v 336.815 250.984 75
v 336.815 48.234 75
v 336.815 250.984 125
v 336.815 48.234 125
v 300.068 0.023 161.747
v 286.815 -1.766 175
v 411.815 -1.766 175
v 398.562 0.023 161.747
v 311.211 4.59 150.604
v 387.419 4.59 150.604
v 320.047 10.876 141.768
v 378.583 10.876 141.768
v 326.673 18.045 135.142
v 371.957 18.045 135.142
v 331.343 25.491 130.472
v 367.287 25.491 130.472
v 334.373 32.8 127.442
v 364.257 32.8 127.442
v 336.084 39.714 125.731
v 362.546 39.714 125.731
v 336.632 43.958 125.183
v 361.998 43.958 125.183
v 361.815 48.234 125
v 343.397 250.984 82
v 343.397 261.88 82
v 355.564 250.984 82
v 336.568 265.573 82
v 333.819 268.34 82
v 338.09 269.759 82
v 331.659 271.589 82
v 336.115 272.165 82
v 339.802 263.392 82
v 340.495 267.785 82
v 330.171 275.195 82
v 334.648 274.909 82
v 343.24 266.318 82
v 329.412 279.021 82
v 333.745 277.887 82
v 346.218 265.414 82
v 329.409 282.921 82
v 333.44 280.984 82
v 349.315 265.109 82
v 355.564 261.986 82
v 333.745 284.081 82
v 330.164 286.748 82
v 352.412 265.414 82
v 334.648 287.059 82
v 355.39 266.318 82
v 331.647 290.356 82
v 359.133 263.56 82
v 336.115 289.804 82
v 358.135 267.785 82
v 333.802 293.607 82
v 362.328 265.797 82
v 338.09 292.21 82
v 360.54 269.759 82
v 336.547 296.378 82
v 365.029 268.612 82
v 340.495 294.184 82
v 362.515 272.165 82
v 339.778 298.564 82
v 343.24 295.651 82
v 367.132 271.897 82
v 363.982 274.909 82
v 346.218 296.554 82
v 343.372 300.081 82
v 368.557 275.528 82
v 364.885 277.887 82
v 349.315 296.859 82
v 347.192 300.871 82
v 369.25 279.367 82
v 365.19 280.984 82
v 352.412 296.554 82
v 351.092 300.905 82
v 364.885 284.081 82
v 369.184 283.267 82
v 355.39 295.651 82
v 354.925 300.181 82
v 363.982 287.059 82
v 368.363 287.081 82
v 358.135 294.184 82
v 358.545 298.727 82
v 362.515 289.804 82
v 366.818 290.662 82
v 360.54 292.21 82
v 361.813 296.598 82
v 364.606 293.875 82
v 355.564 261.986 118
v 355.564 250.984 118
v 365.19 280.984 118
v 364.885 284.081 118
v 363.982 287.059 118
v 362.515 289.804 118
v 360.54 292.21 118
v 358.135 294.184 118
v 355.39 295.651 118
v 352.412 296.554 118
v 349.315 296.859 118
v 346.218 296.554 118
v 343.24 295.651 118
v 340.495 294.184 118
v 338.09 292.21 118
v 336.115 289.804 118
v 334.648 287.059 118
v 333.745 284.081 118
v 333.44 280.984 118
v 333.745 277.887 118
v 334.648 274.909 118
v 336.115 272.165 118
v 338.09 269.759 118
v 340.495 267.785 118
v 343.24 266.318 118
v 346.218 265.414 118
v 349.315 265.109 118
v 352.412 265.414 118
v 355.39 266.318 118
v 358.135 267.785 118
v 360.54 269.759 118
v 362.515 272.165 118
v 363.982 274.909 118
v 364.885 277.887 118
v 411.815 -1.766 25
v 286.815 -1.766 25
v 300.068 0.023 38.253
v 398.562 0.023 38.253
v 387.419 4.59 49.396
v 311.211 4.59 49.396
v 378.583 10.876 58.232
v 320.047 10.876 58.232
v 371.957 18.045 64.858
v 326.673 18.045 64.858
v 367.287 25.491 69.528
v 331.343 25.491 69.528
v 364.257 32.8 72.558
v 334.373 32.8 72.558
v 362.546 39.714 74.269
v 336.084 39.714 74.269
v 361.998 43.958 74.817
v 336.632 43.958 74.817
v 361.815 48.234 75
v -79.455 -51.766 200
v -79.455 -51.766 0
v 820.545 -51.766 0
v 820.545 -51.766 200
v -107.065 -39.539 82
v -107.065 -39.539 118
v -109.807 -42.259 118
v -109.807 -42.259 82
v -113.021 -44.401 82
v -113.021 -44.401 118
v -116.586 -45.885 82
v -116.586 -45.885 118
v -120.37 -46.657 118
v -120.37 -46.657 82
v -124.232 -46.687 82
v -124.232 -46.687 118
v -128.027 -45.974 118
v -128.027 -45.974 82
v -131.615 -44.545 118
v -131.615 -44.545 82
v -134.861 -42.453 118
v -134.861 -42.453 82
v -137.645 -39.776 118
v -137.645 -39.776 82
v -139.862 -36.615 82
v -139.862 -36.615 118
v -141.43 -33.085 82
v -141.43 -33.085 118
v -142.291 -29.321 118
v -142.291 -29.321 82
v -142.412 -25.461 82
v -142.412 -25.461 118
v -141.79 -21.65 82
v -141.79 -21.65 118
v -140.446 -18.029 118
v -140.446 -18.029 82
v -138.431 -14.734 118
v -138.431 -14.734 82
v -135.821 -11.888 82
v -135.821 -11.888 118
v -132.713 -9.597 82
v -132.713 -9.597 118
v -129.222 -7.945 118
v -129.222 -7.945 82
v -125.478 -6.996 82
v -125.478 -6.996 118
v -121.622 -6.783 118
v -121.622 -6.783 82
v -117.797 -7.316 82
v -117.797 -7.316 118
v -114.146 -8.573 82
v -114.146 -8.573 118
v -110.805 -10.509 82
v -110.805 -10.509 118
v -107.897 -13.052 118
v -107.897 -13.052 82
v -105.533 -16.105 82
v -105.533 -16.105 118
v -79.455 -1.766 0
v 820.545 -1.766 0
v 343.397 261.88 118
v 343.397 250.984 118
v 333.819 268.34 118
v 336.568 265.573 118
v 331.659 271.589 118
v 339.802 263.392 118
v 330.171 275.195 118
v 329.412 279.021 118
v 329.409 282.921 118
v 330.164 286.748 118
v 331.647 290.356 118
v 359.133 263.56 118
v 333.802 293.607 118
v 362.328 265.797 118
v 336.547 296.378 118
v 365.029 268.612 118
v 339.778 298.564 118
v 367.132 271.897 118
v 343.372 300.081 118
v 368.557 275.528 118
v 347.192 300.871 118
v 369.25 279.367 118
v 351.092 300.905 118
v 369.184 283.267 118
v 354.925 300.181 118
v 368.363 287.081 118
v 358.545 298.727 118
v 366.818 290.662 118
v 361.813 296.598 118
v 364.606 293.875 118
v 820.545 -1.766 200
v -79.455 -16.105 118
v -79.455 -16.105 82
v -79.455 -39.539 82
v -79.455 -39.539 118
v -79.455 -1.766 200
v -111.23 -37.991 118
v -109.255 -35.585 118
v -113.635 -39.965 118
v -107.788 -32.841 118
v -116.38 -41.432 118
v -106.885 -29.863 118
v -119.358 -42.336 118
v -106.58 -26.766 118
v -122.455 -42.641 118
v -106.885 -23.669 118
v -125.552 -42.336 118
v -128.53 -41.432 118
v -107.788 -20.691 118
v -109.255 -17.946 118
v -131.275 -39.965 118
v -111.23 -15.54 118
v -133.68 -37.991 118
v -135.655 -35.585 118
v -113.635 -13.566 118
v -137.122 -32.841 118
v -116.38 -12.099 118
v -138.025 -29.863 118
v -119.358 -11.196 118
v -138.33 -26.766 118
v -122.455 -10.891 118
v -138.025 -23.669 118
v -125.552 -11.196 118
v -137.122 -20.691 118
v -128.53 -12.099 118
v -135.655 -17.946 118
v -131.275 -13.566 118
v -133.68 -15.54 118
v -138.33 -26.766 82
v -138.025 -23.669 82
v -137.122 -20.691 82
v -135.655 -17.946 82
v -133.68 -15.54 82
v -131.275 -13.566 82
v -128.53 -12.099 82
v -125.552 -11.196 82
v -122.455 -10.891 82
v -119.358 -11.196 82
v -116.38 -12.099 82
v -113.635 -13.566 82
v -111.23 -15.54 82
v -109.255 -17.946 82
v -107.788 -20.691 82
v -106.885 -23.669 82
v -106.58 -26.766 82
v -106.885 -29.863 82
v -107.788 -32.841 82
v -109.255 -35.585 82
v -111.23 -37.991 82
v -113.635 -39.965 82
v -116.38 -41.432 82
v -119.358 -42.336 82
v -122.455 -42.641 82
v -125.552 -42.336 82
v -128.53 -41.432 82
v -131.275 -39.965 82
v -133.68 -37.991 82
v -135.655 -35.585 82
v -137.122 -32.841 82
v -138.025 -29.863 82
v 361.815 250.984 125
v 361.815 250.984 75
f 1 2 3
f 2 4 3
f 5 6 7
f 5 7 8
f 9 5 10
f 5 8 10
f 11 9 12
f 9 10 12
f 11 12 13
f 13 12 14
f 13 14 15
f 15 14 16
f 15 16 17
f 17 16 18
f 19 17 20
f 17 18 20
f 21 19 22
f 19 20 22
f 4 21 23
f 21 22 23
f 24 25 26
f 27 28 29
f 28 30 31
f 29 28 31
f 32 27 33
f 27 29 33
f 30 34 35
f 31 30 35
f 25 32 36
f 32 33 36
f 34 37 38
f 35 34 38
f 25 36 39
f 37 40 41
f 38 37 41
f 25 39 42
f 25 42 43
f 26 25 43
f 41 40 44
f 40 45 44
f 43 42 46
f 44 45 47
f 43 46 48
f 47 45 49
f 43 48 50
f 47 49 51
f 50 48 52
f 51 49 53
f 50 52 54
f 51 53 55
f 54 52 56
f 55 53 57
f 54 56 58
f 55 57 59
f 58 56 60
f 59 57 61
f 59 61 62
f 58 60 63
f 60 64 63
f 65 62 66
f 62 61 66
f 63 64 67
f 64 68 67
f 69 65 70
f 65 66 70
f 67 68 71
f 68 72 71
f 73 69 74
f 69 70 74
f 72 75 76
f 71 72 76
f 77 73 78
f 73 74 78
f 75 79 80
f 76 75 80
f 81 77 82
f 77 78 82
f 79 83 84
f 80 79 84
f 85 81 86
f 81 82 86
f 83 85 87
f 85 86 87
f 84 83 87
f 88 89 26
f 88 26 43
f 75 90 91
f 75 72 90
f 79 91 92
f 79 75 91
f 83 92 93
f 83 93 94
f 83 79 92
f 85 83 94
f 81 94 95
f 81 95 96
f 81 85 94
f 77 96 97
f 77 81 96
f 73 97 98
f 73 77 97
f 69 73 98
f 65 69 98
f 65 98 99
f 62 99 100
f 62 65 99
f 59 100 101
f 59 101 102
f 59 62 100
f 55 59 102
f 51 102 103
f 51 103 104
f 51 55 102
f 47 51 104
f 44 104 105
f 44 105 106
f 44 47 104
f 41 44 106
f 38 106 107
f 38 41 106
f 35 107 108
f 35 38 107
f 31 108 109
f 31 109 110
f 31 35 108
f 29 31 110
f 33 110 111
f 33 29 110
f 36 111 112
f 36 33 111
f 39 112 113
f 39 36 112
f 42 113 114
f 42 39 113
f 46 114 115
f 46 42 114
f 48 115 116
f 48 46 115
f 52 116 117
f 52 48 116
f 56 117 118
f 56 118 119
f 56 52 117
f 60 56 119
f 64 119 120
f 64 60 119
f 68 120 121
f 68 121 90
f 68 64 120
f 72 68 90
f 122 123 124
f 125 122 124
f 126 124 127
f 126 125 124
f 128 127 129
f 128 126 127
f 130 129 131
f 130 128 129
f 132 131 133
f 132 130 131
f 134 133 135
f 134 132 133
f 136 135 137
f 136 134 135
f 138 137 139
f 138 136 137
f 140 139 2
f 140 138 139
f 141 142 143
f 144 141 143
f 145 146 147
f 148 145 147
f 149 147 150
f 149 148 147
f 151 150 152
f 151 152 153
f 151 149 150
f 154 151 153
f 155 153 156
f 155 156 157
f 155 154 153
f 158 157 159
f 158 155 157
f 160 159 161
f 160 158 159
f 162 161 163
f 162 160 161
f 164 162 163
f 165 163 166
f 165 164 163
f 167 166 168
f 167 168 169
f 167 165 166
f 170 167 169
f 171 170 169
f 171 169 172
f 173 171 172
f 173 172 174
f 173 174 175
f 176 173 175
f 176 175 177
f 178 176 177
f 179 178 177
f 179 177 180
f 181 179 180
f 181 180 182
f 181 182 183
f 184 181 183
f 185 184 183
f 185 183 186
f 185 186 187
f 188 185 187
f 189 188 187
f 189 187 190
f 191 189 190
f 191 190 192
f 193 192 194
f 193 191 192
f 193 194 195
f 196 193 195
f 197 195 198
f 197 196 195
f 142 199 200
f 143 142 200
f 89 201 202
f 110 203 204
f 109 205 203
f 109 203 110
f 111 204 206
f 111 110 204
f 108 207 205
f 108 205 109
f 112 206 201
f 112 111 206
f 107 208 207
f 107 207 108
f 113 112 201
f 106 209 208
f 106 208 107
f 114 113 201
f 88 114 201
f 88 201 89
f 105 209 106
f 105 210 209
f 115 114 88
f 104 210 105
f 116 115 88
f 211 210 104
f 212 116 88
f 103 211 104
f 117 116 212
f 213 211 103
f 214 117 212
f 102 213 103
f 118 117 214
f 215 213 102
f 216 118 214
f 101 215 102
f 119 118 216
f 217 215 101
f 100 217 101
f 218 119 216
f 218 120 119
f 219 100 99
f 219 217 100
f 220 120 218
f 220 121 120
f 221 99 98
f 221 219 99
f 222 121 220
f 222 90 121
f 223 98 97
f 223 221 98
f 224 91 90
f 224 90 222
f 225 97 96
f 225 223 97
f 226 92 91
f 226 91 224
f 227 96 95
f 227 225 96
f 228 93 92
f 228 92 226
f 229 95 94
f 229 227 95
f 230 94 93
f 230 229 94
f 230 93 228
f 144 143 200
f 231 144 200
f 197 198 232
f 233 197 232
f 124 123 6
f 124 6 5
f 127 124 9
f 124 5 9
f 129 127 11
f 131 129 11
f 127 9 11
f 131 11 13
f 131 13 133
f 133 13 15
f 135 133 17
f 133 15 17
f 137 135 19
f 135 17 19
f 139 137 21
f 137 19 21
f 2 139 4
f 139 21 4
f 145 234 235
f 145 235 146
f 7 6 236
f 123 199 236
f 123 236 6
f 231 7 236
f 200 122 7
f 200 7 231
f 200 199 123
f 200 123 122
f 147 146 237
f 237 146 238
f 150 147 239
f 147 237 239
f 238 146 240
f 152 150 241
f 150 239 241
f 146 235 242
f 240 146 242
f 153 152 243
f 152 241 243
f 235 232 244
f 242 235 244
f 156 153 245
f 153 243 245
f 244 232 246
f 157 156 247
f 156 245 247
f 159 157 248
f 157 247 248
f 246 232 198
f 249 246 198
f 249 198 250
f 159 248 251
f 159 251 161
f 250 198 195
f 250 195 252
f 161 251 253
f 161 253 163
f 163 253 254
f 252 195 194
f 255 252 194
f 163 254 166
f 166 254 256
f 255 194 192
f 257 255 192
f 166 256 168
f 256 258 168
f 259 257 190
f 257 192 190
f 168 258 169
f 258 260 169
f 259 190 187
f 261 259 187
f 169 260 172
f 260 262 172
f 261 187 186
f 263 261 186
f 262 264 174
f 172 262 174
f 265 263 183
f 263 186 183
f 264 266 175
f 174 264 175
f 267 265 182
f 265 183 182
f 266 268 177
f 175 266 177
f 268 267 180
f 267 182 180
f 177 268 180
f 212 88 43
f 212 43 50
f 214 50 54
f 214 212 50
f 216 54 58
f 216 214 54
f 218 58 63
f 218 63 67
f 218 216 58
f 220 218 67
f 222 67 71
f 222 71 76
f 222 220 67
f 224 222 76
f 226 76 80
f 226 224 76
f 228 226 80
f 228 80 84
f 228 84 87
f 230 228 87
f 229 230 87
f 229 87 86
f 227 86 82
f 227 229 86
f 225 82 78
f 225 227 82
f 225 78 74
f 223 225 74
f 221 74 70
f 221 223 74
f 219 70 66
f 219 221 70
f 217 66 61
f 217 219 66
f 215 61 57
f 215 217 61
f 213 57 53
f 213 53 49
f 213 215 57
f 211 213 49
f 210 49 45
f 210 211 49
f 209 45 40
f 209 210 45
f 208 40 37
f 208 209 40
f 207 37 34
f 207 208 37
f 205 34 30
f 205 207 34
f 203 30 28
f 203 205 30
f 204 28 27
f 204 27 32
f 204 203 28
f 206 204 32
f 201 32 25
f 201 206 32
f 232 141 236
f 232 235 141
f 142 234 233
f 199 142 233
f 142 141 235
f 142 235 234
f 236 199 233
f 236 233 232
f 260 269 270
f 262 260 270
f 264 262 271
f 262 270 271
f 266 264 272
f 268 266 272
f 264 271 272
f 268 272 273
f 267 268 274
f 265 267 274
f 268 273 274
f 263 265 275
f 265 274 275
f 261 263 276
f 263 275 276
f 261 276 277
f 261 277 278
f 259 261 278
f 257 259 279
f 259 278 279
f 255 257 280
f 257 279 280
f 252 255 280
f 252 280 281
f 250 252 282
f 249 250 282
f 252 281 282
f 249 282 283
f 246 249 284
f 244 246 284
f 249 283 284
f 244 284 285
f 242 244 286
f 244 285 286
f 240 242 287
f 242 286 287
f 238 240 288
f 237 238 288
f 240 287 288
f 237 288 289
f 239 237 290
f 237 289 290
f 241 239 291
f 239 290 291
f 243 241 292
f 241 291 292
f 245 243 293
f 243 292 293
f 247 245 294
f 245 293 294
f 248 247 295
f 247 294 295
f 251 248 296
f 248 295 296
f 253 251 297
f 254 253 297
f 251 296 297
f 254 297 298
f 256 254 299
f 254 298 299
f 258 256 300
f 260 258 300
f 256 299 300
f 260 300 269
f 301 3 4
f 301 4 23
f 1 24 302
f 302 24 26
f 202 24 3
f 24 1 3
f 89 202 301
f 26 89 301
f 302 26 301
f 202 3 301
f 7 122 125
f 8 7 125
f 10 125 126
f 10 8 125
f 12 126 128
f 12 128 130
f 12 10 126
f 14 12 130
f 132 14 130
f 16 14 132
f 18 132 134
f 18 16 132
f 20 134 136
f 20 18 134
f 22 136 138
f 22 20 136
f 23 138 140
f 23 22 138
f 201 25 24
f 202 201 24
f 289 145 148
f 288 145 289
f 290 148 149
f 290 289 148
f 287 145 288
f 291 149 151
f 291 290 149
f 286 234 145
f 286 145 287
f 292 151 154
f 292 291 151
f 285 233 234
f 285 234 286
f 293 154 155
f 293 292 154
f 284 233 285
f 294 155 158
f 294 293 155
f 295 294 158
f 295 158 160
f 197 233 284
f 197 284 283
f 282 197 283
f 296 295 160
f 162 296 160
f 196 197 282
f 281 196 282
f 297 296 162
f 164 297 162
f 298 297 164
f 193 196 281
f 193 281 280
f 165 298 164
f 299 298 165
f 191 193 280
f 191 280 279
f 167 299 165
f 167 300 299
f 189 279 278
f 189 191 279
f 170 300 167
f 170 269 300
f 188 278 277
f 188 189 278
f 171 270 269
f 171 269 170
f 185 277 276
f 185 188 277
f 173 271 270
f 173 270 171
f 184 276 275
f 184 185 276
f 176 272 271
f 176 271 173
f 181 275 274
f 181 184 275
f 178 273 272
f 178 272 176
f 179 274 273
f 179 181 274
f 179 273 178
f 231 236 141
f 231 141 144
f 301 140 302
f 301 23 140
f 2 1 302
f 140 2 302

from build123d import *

# Parameters (mm, degrees)
SKETCH1_W           = 900
SKETCH1_H           = 50
BOSS_EXTRUDE1_DEPTH = 200
BOSS_EXTRUDE2_START = -82
SKETCH4_R           = 20
SKETCH4_R_2         = 15.875
BOSS_EXTRUDE2_DEPTH = 36
SKETCH8_W           = 25
SKETCH8_H           = 252.75
BOSS_EXTRUDE3_DEPTH = 25
FILLET1_R           = 50
SKETCH9_R           = 15.875
BOSS_EXTRUDE4_DEPTH = 18


with BuildPart() as part:
    # Sketch1 → Boss-Extrude1 (new body)
    with BuildSketch(Plane.XY):
        with Locations((370.54501266, -26.765800796)):
            Rectangle(SKETCH1_W, SKETCH1_H)
    extrude(amount=BOSS_EXTRUDE1_DEPTH)

    # Sketch4 → Boss-Extrude2 (add)
    # profile 1 of 2: a face of its own
    with BuildSketch(Plane(origin=(0, 0, 0), x_dir=(-1, 0, 0), z_dir=(0, 0, -1)).offset(BOSS_EXTRUDE2_START)):
        with BuildLine():
            Line((79.45498734, -16.105071334), (79.45498734, -26.765800796))
            Line((79.45498734, -26.765800796), (79.45498734, -39.539290307))
            Line((79.45498734, -39.539290307), (107.065446551, -39.539290307))
            ThreePointArc((107.065446551, -39.539290307), (102.497605949, -28.070763635), (105.53314207, -16.105071334))
            Line((105.53314207, -16.105071334), (79.45498734, -16.105071334))
        make_face()
    # profile 2 of 2: a face of its own
    with BuildSketch(Plane(origin=(0, 0, 0), x_dir=(-1, 0, 0), z_dir=(0, 0, -1)).offset(BOSS_EXTRUDE2_START)):
        with Locations((122.45498734, -26.765800796)):
            Circle(SKETCH4_R)
        with Locations((122.45498734, -26.765800796)):
            Circle(SKETCH4_R_2, mode=Mode.SUBTRACT)
    extrude(amount=-BOSS_EXTRUDE2_DEPTH)

    # Sketch8 → Boss-Extrude3 (add, symmetric)
    with BuildSketch(Plane.XY.offset(100)):
        with Locations((349.31501266, 124.609199204)):
            Rectangle(SKETCH8_W, SKETCH8_H)
    extrude(amount=BOSS_EXTRUDE3_DEPTH, both=True)

    # Fillet1
    fillet1_edges = [part.edges().sort_by_distance(p)[0] for p in [
        (349.31501266, -1.765800796, 75),
        (336.81501266, -1.765800796, 100),
        (361.81501266, -1.765800796, 100),
        (349.31501266, -1.765800796, 125),
    ]]
    fillet(fillet1_edges, radius=FILLET1_R)

    # Sketch9 → Boss-Extrude4 (add, symmetric)
    with BuildSketch(Plane.XY.offset(100)):
        with BuildLine():
            Line((343.39732273, 250.984199204), (355.564186934, 250.984199204))
            Line((355.564186934, 250.984199204), (355.564186934, 261.985572388))
            ThreePointArc((355.564186934, 261.985572388), (349.141025878, 300.983442405), (343.39732273, 261.879724705))
            Line((343.39732273, 261.879724705), (343.39732273, 250.984199204))
        make_face()
        with Locations((349.31501266, 280.984199204)):
            Circle(SKETCH9_R, mode=Mode.SUBTRACT)
    extrude(amount=BOSS_EXTRUDE4_DEPTH, both=True)


solid = part.part
